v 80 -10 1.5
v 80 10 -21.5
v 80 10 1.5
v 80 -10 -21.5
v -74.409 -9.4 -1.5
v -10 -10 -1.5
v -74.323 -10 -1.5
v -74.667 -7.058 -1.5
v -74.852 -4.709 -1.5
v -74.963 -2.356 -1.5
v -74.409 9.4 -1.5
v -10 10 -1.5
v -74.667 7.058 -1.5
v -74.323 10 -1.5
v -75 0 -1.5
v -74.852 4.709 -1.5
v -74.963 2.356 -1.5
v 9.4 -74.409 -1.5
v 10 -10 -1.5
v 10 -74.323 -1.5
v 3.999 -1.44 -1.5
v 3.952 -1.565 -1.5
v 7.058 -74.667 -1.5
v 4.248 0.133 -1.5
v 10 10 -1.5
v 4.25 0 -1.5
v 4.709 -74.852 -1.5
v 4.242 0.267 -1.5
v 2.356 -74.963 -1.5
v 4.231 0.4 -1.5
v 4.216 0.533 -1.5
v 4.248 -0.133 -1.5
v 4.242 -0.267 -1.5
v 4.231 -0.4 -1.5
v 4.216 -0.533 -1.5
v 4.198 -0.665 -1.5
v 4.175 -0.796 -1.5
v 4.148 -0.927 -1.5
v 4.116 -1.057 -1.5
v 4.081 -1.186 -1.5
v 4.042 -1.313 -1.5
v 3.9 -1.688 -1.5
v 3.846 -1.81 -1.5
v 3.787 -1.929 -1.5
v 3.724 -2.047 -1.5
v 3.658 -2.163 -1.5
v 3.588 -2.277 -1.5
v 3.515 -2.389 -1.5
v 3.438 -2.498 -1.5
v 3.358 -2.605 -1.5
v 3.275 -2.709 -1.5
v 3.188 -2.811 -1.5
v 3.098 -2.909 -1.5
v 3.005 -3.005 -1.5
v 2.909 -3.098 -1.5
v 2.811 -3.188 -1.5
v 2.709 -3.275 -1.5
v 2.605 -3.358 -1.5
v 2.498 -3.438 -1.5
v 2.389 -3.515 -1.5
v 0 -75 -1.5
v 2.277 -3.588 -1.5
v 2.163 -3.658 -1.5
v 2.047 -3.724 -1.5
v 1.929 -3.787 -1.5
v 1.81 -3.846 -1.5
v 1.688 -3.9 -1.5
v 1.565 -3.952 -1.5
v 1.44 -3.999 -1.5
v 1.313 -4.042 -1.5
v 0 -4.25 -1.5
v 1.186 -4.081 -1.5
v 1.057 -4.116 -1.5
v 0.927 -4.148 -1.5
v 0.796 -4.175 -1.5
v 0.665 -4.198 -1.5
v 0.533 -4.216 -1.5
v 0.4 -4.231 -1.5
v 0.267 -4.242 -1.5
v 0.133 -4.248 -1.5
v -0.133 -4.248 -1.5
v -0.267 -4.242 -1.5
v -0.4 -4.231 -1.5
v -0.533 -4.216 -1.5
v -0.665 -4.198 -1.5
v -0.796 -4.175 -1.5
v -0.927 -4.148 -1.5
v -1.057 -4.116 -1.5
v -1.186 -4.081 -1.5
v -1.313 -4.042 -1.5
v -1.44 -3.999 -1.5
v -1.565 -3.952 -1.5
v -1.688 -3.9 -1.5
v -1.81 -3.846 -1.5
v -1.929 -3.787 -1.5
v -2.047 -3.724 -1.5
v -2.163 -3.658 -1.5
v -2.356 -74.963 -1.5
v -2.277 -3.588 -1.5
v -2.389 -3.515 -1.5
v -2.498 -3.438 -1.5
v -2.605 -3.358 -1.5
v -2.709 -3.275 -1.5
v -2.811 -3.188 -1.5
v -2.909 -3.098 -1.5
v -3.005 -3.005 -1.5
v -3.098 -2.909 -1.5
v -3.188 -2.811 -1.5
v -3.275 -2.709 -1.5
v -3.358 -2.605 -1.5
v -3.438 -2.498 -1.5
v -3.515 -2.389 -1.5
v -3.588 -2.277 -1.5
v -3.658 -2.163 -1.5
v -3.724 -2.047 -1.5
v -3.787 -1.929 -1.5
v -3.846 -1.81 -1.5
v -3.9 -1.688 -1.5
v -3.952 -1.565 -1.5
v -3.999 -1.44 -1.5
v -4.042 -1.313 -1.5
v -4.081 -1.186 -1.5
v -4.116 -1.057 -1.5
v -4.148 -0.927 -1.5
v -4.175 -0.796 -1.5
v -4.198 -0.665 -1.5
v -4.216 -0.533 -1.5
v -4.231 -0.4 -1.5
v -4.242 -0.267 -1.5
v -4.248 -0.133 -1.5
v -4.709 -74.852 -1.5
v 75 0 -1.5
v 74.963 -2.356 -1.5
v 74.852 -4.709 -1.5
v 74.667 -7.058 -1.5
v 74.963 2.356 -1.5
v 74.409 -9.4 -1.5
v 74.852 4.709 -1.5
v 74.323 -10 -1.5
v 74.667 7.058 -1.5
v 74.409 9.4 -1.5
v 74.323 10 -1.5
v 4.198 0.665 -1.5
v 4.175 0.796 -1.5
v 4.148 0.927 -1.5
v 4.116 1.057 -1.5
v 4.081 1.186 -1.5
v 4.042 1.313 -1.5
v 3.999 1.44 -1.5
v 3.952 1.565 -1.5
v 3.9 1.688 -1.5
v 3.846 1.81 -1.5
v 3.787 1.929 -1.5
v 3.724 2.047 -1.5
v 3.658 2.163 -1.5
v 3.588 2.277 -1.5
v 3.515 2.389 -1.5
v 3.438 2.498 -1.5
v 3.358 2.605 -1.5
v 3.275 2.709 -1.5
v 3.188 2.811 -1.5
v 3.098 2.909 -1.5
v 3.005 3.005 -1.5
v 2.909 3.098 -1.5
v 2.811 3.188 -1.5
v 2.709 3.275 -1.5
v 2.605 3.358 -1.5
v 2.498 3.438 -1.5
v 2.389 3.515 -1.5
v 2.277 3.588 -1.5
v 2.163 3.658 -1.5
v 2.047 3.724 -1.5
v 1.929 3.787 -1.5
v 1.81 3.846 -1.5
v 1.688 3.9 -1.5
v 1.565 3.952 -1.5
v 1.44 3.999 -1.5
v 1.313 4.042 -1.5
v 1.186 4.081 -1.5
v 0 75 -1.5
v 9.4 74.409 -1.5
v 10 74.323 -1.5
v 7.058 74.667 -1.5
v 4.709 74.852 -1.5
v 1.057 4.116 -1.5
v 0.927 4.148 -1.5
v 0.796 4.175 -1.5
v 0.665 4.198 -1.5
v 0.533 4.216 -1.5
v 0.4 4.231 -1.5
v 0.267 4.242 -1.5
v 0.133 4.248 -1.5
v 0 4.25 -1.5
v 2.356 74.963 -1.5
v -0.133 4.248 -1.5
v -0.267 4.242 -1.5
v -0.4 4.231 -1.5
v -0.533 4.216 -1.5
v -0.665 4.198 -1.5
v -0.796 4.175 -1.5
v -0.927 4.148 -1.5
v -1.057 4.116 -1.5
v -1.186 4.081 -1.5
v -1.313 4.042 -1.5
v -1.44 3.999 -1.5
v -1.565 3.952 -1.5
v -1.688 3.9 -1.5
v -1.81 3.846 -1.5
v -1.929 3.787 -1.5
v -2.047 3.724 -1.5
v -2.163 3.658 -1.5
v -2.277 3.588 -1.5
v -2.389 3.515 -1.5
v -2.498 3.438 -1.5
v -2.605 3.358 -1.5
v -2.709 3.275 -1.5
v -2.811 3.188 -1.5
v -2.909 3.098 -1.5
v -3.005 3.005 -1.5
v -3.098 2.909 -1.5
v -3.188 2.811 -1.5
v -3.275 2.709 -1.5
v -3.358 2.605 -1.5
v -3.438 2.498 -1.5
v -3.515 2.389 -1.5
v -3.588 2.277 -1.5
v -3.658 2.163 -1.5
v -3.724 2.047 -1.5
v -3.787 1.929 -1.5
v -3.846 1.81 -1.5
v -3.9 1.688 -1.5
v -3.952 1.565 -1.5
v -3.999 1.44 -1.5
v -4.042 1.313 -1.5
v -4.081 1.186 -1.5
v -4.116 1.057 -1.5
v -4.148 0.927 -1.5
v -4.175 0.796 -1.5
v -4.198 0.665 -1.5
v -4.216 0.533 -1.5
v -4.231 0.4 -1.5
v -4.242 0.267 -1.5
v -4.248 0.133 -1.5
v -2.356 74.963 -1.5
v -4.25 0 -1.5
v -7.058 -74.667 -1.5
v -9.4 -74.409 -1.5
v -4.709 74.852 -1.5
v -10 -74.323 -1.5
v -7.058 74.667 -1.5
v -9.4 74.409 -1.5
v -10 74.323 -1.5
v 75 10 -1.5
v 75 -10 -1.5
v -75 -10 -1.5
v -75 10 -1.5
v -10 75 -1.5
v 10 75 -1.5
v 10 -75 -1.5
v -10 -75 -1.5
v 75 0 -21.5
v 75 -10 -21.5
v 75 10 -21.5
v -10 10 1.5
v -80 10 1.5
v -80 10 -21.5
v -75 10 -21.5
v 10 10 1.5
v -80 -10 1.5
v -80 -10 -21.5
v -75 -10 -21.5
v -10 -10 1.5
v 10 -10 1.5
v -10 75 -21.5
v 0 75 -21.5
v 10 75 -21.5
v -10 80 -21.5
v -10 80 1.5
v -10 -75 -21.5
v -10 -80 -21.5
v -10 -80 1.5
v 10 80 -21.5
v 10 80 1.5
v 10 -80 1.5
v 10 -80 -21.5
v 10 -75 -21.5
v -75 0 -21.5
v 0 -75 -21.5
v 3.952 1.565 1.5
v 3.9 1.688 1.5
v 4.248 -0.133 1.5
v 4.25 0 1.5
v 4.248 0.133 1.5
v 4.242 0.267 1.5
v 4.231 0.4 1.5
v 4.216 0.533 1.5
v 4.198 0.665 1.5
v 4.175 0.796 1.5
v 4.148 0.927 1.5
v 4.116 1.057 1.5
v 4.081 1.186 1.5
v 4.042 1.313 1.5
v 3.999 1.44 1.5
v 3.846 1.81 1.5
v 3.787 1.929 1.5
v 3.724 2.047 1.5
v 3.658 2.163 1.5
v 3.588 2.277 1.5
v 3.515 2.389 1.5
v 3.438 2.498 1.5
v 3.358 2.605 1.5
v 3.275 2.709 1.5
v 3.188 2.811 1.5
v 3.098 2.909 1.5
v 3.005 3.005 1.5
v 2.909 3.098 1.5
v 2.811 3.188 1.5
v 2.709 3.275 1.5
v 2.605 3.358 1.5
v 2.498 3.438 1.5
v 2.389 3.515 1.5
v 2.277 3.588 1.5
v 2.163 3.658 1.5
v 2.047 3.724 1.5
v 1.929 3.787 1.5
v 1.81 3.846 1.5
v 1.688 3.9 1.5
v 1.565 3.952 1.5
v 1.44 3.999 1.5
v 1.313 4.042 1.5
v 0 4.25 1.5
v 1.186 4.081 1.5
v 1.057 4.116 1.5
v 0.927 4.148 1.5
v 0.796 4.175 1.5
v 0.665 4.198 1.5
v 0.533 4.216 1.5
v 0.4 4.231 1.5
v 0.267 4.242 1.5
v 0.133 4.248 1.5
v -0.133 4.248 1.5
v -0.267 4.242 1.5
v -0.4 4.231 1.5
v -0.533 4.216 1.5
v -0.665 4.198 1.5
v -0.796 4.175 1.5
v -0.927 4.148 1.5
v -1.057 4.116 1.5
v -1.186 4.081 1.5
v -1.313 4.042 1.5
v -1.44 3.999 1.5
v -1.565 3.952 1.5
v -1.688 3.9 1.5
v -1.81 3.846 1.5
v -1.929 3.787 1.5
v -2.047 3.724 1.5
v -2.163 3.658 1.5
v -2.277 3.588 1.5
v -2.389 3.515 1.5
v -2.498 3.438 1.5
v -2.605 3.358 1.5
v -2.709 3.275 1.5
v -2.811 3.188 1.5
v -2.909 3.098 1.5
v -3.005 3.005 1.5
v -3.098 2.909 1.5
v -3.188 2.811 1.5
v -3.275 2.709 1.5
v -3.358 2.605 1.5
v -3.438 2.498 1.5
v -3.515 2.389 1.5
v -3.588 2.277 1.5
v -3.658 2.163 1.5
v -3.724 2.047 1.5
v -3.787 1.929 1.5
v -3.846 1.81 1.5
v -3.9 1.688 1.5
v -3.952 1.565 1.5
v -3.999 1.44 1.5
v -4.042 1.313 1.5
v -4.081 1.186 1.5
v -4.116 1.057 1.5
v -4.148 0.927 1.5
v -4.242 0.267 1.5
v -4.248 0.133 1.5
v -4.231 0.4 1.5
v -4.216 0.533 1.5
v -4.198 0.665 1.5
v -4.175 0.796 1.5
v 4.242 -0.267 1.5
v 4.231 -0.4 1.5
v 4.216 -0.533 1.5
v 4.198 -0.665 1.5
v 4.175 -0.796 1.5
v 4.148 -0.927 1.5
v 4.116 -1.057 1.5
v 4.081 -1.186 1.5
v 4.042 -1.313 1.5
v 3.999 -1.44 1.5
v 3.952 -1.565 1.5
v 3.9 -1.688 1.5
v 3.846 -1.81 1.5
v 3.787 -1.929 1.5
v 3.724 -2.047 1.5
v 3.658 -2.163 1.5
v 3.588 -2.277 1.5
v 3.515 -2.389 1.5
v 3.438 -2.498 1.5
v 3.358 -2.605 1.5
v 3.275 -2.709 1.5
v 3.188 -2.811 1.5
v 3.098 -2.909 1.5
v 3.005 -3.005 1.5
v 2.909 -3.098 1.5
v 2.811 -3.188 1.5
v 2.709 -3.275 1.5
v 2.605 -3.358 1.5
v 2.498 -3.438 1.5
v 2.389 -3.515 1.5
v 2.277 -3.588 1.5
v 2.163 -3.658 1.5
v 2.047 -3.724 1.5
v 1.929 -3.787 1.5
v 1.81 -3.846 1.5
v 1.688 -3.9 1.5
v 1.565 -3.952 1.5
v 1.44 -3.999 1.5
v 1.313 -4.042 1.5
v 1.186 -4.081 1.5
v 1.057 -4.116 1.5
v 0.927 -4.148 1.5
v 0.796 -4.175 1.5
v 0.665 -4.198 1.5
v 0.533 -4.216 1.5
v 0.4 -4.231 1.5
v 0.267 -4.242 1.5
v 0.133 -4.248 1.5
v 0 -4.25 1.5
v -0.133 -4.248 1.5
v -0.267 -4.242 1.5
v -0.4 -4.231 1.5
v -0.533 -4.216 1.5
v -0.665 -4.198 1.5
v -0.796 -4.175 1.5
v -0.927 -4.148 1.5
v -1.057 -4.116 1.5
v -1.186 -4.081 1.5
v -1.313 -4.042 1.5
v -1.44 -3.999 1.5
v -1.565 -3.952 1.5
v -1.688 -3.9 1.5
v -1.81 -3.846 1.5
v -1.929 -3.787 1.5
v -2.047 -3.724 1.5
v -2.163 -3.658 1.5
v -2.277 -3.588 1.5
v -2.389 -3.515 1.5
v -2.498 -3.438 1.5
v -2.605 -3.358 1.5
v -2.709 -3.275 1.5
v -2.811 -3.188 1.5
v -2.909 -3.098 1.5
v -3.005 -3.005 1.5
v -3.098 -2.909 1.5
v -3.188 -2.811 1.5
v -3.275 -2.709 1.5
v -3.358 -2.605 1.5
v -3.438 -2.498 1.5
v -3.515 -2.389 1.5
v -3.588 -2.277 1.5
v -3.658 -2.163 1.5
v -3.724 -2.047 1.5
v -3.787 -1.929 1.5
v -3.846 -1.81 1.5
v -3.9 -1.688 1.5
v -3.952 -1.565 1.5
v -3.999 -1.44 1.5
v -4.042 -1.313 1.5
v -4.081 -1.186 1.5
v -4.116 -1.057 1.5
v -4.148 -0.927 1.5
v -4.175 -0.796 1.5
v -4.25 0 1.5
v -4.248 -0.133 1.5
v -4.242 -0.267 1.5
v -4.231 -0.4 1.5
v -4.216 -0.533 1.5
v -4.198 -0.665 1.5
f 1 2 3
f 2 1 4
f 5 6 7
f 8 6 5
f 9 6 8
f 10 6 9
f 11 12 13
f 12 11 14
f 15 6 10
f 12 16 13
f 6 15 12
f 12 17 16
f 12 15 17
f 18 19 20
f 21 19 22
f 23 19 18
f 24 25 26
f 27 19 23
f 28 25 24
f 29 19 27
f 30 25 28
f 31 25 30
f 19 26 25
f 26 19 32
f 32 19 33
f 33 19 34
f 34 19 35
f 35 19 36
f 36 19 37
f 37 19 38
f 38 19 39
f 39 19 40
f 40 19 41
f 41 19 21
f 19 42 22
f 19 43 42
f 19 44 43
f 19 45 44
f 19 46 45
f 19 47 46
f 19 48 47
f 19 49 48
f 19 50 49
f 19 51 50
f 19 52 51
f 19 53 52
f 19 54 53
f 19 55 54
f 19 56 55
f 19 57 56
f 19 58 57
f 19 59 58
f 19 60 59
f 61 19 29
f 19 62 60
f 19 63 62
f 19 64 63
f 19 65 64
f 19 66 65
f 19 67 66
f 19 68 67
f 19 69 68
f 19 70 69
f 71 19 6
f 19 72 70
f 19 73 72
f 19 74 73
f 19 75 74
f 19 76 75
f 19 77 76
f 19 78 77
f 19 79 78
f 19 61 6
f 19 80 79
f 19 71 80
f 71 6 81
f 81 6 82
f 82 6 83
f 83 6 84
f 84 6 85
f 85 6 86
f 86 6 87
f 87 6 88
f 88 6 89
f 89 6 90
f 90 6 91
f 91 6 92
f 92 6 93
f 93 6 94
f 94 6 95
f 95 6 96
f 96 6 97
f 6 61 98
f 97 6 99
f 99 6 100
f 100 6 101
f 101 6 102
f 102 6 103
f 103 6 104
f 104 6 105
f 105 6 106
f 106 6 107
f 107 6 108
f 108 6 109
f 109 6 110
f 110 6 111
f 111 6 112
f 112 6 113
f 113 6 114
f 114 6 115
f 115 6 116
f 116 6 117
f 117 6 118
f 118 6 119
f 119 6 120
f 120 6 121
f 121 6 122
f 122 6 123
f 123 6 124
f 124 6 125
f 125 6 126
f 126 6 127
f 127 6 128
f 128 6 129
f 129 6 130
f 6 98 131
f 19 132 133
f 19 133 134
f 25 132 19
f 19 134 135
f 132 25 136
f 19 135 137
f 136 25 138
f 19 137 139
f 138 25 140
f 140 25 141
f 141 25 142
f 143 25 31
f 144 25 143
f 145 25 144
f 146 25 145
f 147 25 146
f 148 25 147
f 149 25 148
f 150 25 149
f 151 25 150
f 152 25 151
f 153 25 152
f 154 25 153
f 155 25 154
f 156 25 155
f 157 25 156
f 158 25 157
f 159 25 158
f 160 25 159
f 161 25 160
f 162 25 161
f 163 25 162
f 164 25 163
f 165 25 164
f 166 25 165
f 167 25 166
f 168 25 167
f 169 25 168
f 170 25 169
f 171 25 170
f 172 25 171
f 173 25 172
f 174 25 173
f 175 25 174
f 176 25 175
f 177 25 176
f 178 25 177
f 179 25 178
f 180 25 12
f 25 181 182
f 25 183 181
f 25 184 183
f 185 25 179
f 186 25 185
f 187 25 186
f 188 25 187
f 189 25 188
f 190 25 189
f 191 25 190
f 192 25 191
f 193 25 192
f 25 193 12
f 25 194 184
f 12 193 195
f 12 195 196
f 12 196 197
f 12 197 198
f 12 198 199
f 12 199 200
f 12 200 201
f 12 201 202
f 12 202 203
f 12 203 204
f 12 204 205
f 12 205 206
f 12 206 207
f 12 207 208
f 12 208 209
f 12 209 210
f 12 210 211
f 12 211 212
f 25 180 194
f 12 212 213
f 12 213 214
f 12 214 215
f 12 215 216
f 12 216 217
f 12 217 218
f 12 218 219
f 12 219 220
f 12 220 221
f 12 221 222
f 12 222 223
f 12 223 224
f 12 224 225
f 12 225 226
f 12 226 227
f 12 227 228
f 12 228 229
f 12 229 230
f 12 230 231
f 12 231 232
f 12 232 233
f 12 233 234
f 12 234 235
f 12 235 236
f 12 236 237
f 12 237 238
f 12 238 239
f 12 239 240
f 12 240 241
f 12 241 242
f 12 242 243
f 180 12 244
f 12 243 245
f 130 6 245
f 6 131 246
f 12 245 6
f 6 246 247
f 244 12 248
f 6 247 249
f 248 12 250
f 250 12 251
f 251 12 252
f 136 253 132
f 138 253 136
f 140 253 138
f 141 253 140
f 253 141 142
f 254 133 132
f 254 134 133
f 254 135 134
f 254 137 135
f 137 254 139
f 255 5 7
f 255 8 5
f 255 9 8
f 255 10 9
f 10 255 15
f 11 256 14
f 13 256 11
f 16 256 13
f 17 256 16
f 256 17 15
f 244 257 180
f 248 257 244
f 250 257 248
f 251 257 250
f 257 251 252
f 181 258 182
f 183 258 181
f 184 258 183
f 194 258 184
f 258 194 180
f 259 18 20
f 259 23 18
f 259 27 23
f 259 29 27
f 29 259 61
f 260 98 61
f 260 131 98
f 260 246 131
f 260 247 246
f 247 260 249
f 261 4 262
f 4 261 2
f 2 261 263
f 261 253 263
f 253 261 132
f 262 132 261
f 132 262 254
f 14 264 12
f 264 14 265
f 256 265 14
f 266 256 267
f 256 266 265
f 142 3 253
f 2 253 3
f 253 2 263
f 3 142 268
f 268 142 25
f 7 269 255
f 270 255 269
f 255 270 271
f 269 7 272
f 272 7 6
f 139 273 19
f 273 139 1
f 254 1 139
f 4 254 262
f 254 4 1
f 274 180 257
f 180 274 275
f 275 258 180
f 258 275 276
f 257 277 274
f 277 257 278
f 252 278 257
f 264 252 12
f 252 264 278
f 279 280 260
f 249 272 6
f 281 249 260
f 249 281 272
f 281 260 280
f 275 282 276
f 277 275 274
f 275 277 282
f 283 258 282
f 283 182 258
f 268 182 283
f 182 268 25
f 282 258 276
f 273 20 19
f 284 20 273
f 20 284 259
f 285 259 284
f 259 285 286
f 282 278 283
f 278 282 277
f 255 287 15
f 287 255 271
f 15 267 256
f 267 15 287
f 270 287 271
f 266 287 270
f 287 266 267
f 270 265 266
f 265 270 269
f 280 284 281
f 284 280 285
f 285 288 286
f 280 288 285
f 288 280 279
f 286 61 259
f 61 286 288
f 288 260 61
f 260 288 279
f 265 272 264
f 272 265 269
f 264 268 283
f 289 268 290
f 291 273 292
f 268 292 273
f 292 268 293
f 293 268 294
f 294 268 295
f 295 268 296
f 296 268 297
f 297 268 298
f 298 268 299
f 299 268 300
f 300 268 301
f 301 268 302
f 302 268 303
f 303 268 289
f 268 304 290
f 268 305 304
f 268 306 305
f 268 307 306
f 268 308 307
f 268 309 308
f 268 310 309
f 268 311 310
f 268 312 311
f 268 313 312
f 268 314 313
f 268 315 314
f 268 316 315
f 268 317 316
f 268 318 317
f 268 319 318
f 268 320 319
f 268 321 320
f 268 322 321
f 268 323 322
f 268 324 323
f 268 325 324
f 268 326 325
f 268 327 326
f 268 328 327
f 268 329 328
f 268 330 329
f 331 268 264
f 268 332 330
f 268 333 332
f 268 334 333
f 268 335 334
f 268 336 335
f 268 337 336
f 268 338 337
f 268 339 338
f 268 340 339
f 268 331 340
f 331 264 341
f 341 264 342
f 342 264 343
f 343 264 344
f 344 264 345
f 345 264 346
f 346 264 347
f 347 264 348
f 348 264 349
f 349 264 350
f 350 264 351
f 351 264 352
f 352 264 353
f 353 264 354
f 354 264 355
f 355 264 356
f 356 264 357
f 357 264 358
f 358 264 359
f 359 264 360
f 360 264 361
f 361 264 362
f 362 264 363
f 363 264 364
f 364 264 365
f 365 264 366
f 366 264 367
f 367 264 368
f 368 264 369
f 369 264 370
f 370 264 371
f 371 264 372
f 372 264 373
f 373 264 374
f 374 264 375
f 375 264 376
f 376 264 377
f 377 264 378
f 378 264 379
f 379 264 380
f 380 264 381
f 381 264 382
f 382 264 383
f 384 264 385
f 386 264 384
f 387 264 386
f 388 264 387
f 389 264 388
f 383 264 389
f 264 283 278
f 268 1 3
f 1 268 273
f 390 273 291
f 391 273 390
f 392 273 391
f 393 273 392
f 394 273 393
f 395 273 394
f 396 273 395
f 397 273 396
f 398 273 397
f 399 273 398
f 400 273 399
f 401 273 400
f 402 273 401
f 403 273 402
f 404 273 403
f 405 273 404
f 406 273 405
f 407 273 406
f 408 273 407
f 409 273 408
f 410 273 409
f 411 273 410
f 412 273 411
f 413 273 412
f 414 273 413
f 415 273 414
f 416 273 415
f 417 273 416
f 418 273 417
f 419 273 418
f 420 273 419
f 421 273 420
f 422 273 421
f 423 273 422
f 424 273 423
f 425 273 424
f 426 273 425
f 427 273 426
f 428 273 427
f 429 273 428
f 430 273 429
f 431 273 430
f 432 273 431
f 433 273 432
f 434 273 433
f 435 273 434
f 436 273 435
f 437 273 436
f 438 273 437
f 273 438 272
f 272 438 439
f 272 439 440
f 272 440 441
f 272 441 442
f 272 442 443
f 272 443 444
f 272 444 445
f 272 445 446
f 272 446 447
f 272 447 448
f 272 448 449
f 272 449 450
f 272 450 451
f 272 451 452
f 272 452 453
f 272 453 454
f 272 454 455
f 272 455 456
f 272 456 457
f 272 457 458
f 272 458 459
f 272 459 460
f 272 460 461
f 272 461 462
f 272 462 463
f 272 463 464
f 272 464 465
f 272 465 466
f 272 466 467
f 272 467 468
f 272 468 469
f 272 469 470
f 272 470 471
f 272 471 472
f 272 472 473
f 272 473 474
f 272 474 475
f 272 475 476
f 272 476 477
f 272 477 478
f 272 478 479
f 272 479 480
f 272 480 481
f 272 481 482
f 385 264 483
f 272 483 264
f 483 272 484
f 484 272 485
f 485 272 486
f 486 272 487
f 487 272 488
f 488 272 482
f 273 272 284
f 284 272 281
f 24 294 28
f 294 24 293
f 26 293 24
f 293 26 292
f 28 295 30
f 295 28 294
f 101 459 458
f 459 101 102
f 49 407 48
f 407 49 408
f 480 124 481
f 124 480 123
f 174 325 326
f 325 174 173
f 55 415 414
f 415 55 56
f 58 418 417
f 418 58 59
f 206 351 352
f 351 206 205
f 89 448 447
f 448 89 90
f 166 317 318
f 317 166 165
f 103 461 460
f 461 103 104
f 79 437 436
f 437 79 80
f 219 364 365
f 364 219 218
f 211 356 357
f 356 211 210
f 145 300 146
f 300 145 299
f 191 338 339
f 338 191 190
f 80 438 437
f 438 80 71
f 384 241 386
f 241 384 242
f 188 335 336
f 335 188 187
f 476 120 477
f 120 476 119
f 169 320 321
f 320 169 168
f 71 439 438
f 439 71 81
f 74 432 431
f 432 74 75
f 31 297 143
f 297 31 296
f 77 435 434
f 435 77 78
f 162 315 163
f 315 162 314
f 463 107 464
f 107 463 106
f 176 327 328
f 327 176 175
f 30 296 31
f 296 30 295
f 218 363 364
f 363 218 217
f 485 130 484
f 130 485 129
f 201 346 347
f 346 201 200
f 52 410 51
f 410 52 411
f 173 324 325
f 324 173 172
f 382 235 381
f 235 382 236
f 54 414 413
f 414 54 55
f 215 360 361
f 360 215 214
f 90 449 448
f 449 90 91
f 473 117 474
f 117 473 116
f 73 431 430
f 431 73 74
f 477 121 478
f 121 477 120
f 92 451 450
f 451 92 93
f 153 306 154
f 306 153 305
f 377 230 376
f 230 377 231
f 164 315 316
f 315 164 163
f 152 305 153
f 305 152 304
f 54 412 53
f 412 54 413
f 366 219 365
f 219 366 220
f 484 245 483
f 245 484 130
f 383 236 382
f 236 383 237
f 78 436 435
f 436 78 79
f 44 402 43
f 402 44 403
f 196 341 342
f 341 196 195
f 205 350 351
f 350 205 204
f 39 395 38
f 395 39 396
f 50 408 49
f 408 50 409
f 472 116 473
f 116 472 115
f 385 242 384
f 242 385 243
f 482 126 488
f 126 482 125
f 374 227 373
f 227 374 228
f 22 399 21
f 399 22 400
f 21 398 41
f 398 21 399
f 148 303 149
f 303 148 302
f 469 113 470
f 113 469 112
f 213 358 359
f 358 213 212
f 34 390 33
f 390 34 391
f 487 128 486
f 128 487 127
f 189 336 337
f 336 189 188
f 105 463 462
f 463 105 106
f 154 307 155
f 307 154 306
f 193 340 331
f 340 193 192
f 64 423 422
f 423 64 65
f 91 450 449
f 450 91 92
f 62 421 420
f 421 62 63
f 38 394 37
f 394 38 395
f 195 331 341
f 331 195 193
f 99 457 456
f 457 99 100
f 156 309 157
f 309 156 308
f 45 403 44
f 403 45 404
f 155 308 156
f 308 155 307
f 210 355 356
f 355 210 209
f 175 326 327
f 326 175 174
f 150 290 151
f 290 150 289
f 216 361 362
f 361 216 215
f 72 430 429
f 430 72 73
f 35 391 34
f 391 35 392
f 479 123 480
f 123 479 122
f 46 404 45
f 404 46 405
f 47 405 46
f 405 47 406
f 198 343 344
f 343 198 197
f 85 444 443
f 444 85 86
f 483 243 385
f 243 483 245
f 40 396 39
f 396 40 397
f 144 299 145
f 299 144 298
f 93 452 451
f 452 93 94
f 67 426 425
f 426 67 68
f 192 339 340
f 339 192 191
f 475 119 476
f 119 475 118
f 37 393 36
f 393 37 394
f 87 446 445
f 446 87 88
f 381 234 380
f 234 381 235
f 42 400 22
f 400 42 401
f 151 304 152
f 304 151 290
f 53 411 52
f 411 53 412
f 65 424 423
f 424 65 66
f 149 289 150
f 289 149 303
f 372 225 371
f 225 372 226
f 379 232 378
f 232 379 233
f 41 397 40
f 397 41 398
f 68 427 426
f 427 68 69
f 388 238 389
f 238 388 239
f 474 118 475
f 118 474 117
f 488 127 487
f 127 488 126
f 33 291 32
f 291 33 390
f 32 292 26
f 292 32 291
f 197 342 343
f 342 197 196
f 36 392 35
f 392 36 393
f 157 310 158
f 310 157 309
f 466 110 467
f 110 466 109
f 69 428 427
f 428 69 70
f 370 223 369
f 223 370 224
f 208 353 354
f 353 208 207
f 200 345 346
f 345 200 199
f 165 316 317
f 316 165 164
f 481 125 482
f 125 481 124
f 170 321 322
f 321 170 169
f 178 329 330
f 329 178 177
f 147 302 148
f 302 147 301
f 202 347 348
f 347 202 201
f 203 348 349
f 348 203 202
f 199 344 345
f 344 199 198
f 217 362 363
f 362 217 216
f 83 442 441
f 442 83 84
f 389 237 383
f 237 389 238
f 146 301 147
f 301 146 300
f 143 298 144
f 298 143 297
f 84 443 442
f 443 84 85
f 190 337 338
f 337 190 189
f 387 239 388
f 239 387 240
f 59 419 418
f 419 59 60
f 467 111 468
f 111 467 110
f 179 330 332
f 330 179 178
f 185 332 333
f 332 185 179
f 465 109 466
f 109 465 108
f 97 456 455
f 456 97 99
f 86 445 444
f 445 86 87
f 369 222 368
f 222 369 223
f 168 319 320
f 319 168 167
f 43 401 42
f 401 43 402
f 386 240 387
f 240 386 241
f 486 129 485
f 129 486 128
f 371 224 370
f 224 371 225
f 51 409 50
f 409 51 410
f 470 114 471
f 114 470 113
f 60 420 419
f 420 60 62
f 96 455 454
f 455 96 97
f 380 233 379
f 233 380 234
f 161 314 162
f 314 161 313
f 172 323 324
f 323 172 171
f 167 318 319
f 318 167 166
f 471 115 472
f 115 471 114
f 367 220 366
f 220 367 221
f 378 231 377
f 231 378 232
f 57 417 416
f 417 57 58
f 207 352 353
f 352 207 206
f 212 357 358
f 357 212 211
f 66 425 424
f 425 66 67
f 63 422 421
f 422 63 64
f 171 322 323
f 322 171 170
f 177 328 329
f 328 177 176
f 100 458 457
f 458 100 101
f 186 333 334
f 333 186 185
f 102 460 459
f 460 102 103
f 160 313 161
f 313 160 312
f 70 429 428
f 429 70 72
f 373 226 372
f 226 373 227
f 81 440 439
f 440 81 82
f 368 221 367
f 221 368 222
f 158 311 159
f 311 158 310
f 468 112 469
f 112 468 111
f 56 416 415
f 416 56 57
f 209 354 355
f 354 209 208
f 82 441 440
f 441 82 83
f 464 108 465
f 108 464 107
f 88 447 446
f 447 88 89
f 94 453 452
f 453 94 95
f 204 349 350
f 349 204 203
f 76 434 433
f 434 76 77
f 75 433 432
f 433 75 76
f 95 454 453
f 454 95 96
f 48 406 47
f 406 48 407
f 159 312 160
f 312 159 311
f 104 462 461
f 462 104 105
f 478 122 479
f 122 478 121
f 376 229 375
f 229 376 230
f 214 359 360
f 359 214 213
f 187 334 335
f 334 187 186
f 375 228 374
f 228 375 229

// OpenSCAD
placer=0; //1 = Generate a Placement tool, so you can use it to place the center dot through the locator tool. 0 = Don't generate. 
locator=1; // 1 = Generate a Locator tool, which is the main tool, 0= Don't generate

mirror_diameter=150;
arm_height=3;
arm_width=20;
arm_cutout=0; //along half of each arm
support_height=20;
support_thickness=5;
center_dot_diameter=8; 

center_dot_hole_diameter=center_dot_diameter+0.5; //If using placer, you might add 0.1 - 0.5mm 
center_dot_inner_diameter=4;
close_distance=0; //0 for flat supports touching the mirror, 1 or more for a round support.

placer_length=30;
placer_diameter=center_dot_diameter;

$fn=200;


module locator() {
difference(){
union(){
	cube([mirror_diameter+support_thickness*2, arm_width, arm_height], center=true);
	
	cube([arm_width, mirror_diameter+support_thickness*2,  arm_height], center=true);
	for (i = [0:3]) {
		rotate([0,0,90*i]) 
	translate([mirror_diameter/2-close_distance,-arm_width/2,-arm_height/2-support_height])
		cube([support_thickness+close_distance, arm_width, support_height]);
	}
	
} //union
	translate([0,0,-arm_height/2-support_height])
	cylinder(h=support_height, r=mirror_diameter/2);
	cylinder(h=arm_height*2,r=center_dot_hole_diameter/2, center=true);
    if (arm_cutout > 0) {
	for (i = [0:3]) {
		rotate([0,0,90*i]) 
	translate([mirror_diameter/4,0,0])
		cube([arm_cutout, arm_width/2, arm_height*2], center=true);
	}
}
}
}


module placer() {
		cylinder(h=placer_length,r=center_dot_diameter/2, center=true);
	
	
}

if (locator == 1 )
locator();
if (placer == 1)
placer();
